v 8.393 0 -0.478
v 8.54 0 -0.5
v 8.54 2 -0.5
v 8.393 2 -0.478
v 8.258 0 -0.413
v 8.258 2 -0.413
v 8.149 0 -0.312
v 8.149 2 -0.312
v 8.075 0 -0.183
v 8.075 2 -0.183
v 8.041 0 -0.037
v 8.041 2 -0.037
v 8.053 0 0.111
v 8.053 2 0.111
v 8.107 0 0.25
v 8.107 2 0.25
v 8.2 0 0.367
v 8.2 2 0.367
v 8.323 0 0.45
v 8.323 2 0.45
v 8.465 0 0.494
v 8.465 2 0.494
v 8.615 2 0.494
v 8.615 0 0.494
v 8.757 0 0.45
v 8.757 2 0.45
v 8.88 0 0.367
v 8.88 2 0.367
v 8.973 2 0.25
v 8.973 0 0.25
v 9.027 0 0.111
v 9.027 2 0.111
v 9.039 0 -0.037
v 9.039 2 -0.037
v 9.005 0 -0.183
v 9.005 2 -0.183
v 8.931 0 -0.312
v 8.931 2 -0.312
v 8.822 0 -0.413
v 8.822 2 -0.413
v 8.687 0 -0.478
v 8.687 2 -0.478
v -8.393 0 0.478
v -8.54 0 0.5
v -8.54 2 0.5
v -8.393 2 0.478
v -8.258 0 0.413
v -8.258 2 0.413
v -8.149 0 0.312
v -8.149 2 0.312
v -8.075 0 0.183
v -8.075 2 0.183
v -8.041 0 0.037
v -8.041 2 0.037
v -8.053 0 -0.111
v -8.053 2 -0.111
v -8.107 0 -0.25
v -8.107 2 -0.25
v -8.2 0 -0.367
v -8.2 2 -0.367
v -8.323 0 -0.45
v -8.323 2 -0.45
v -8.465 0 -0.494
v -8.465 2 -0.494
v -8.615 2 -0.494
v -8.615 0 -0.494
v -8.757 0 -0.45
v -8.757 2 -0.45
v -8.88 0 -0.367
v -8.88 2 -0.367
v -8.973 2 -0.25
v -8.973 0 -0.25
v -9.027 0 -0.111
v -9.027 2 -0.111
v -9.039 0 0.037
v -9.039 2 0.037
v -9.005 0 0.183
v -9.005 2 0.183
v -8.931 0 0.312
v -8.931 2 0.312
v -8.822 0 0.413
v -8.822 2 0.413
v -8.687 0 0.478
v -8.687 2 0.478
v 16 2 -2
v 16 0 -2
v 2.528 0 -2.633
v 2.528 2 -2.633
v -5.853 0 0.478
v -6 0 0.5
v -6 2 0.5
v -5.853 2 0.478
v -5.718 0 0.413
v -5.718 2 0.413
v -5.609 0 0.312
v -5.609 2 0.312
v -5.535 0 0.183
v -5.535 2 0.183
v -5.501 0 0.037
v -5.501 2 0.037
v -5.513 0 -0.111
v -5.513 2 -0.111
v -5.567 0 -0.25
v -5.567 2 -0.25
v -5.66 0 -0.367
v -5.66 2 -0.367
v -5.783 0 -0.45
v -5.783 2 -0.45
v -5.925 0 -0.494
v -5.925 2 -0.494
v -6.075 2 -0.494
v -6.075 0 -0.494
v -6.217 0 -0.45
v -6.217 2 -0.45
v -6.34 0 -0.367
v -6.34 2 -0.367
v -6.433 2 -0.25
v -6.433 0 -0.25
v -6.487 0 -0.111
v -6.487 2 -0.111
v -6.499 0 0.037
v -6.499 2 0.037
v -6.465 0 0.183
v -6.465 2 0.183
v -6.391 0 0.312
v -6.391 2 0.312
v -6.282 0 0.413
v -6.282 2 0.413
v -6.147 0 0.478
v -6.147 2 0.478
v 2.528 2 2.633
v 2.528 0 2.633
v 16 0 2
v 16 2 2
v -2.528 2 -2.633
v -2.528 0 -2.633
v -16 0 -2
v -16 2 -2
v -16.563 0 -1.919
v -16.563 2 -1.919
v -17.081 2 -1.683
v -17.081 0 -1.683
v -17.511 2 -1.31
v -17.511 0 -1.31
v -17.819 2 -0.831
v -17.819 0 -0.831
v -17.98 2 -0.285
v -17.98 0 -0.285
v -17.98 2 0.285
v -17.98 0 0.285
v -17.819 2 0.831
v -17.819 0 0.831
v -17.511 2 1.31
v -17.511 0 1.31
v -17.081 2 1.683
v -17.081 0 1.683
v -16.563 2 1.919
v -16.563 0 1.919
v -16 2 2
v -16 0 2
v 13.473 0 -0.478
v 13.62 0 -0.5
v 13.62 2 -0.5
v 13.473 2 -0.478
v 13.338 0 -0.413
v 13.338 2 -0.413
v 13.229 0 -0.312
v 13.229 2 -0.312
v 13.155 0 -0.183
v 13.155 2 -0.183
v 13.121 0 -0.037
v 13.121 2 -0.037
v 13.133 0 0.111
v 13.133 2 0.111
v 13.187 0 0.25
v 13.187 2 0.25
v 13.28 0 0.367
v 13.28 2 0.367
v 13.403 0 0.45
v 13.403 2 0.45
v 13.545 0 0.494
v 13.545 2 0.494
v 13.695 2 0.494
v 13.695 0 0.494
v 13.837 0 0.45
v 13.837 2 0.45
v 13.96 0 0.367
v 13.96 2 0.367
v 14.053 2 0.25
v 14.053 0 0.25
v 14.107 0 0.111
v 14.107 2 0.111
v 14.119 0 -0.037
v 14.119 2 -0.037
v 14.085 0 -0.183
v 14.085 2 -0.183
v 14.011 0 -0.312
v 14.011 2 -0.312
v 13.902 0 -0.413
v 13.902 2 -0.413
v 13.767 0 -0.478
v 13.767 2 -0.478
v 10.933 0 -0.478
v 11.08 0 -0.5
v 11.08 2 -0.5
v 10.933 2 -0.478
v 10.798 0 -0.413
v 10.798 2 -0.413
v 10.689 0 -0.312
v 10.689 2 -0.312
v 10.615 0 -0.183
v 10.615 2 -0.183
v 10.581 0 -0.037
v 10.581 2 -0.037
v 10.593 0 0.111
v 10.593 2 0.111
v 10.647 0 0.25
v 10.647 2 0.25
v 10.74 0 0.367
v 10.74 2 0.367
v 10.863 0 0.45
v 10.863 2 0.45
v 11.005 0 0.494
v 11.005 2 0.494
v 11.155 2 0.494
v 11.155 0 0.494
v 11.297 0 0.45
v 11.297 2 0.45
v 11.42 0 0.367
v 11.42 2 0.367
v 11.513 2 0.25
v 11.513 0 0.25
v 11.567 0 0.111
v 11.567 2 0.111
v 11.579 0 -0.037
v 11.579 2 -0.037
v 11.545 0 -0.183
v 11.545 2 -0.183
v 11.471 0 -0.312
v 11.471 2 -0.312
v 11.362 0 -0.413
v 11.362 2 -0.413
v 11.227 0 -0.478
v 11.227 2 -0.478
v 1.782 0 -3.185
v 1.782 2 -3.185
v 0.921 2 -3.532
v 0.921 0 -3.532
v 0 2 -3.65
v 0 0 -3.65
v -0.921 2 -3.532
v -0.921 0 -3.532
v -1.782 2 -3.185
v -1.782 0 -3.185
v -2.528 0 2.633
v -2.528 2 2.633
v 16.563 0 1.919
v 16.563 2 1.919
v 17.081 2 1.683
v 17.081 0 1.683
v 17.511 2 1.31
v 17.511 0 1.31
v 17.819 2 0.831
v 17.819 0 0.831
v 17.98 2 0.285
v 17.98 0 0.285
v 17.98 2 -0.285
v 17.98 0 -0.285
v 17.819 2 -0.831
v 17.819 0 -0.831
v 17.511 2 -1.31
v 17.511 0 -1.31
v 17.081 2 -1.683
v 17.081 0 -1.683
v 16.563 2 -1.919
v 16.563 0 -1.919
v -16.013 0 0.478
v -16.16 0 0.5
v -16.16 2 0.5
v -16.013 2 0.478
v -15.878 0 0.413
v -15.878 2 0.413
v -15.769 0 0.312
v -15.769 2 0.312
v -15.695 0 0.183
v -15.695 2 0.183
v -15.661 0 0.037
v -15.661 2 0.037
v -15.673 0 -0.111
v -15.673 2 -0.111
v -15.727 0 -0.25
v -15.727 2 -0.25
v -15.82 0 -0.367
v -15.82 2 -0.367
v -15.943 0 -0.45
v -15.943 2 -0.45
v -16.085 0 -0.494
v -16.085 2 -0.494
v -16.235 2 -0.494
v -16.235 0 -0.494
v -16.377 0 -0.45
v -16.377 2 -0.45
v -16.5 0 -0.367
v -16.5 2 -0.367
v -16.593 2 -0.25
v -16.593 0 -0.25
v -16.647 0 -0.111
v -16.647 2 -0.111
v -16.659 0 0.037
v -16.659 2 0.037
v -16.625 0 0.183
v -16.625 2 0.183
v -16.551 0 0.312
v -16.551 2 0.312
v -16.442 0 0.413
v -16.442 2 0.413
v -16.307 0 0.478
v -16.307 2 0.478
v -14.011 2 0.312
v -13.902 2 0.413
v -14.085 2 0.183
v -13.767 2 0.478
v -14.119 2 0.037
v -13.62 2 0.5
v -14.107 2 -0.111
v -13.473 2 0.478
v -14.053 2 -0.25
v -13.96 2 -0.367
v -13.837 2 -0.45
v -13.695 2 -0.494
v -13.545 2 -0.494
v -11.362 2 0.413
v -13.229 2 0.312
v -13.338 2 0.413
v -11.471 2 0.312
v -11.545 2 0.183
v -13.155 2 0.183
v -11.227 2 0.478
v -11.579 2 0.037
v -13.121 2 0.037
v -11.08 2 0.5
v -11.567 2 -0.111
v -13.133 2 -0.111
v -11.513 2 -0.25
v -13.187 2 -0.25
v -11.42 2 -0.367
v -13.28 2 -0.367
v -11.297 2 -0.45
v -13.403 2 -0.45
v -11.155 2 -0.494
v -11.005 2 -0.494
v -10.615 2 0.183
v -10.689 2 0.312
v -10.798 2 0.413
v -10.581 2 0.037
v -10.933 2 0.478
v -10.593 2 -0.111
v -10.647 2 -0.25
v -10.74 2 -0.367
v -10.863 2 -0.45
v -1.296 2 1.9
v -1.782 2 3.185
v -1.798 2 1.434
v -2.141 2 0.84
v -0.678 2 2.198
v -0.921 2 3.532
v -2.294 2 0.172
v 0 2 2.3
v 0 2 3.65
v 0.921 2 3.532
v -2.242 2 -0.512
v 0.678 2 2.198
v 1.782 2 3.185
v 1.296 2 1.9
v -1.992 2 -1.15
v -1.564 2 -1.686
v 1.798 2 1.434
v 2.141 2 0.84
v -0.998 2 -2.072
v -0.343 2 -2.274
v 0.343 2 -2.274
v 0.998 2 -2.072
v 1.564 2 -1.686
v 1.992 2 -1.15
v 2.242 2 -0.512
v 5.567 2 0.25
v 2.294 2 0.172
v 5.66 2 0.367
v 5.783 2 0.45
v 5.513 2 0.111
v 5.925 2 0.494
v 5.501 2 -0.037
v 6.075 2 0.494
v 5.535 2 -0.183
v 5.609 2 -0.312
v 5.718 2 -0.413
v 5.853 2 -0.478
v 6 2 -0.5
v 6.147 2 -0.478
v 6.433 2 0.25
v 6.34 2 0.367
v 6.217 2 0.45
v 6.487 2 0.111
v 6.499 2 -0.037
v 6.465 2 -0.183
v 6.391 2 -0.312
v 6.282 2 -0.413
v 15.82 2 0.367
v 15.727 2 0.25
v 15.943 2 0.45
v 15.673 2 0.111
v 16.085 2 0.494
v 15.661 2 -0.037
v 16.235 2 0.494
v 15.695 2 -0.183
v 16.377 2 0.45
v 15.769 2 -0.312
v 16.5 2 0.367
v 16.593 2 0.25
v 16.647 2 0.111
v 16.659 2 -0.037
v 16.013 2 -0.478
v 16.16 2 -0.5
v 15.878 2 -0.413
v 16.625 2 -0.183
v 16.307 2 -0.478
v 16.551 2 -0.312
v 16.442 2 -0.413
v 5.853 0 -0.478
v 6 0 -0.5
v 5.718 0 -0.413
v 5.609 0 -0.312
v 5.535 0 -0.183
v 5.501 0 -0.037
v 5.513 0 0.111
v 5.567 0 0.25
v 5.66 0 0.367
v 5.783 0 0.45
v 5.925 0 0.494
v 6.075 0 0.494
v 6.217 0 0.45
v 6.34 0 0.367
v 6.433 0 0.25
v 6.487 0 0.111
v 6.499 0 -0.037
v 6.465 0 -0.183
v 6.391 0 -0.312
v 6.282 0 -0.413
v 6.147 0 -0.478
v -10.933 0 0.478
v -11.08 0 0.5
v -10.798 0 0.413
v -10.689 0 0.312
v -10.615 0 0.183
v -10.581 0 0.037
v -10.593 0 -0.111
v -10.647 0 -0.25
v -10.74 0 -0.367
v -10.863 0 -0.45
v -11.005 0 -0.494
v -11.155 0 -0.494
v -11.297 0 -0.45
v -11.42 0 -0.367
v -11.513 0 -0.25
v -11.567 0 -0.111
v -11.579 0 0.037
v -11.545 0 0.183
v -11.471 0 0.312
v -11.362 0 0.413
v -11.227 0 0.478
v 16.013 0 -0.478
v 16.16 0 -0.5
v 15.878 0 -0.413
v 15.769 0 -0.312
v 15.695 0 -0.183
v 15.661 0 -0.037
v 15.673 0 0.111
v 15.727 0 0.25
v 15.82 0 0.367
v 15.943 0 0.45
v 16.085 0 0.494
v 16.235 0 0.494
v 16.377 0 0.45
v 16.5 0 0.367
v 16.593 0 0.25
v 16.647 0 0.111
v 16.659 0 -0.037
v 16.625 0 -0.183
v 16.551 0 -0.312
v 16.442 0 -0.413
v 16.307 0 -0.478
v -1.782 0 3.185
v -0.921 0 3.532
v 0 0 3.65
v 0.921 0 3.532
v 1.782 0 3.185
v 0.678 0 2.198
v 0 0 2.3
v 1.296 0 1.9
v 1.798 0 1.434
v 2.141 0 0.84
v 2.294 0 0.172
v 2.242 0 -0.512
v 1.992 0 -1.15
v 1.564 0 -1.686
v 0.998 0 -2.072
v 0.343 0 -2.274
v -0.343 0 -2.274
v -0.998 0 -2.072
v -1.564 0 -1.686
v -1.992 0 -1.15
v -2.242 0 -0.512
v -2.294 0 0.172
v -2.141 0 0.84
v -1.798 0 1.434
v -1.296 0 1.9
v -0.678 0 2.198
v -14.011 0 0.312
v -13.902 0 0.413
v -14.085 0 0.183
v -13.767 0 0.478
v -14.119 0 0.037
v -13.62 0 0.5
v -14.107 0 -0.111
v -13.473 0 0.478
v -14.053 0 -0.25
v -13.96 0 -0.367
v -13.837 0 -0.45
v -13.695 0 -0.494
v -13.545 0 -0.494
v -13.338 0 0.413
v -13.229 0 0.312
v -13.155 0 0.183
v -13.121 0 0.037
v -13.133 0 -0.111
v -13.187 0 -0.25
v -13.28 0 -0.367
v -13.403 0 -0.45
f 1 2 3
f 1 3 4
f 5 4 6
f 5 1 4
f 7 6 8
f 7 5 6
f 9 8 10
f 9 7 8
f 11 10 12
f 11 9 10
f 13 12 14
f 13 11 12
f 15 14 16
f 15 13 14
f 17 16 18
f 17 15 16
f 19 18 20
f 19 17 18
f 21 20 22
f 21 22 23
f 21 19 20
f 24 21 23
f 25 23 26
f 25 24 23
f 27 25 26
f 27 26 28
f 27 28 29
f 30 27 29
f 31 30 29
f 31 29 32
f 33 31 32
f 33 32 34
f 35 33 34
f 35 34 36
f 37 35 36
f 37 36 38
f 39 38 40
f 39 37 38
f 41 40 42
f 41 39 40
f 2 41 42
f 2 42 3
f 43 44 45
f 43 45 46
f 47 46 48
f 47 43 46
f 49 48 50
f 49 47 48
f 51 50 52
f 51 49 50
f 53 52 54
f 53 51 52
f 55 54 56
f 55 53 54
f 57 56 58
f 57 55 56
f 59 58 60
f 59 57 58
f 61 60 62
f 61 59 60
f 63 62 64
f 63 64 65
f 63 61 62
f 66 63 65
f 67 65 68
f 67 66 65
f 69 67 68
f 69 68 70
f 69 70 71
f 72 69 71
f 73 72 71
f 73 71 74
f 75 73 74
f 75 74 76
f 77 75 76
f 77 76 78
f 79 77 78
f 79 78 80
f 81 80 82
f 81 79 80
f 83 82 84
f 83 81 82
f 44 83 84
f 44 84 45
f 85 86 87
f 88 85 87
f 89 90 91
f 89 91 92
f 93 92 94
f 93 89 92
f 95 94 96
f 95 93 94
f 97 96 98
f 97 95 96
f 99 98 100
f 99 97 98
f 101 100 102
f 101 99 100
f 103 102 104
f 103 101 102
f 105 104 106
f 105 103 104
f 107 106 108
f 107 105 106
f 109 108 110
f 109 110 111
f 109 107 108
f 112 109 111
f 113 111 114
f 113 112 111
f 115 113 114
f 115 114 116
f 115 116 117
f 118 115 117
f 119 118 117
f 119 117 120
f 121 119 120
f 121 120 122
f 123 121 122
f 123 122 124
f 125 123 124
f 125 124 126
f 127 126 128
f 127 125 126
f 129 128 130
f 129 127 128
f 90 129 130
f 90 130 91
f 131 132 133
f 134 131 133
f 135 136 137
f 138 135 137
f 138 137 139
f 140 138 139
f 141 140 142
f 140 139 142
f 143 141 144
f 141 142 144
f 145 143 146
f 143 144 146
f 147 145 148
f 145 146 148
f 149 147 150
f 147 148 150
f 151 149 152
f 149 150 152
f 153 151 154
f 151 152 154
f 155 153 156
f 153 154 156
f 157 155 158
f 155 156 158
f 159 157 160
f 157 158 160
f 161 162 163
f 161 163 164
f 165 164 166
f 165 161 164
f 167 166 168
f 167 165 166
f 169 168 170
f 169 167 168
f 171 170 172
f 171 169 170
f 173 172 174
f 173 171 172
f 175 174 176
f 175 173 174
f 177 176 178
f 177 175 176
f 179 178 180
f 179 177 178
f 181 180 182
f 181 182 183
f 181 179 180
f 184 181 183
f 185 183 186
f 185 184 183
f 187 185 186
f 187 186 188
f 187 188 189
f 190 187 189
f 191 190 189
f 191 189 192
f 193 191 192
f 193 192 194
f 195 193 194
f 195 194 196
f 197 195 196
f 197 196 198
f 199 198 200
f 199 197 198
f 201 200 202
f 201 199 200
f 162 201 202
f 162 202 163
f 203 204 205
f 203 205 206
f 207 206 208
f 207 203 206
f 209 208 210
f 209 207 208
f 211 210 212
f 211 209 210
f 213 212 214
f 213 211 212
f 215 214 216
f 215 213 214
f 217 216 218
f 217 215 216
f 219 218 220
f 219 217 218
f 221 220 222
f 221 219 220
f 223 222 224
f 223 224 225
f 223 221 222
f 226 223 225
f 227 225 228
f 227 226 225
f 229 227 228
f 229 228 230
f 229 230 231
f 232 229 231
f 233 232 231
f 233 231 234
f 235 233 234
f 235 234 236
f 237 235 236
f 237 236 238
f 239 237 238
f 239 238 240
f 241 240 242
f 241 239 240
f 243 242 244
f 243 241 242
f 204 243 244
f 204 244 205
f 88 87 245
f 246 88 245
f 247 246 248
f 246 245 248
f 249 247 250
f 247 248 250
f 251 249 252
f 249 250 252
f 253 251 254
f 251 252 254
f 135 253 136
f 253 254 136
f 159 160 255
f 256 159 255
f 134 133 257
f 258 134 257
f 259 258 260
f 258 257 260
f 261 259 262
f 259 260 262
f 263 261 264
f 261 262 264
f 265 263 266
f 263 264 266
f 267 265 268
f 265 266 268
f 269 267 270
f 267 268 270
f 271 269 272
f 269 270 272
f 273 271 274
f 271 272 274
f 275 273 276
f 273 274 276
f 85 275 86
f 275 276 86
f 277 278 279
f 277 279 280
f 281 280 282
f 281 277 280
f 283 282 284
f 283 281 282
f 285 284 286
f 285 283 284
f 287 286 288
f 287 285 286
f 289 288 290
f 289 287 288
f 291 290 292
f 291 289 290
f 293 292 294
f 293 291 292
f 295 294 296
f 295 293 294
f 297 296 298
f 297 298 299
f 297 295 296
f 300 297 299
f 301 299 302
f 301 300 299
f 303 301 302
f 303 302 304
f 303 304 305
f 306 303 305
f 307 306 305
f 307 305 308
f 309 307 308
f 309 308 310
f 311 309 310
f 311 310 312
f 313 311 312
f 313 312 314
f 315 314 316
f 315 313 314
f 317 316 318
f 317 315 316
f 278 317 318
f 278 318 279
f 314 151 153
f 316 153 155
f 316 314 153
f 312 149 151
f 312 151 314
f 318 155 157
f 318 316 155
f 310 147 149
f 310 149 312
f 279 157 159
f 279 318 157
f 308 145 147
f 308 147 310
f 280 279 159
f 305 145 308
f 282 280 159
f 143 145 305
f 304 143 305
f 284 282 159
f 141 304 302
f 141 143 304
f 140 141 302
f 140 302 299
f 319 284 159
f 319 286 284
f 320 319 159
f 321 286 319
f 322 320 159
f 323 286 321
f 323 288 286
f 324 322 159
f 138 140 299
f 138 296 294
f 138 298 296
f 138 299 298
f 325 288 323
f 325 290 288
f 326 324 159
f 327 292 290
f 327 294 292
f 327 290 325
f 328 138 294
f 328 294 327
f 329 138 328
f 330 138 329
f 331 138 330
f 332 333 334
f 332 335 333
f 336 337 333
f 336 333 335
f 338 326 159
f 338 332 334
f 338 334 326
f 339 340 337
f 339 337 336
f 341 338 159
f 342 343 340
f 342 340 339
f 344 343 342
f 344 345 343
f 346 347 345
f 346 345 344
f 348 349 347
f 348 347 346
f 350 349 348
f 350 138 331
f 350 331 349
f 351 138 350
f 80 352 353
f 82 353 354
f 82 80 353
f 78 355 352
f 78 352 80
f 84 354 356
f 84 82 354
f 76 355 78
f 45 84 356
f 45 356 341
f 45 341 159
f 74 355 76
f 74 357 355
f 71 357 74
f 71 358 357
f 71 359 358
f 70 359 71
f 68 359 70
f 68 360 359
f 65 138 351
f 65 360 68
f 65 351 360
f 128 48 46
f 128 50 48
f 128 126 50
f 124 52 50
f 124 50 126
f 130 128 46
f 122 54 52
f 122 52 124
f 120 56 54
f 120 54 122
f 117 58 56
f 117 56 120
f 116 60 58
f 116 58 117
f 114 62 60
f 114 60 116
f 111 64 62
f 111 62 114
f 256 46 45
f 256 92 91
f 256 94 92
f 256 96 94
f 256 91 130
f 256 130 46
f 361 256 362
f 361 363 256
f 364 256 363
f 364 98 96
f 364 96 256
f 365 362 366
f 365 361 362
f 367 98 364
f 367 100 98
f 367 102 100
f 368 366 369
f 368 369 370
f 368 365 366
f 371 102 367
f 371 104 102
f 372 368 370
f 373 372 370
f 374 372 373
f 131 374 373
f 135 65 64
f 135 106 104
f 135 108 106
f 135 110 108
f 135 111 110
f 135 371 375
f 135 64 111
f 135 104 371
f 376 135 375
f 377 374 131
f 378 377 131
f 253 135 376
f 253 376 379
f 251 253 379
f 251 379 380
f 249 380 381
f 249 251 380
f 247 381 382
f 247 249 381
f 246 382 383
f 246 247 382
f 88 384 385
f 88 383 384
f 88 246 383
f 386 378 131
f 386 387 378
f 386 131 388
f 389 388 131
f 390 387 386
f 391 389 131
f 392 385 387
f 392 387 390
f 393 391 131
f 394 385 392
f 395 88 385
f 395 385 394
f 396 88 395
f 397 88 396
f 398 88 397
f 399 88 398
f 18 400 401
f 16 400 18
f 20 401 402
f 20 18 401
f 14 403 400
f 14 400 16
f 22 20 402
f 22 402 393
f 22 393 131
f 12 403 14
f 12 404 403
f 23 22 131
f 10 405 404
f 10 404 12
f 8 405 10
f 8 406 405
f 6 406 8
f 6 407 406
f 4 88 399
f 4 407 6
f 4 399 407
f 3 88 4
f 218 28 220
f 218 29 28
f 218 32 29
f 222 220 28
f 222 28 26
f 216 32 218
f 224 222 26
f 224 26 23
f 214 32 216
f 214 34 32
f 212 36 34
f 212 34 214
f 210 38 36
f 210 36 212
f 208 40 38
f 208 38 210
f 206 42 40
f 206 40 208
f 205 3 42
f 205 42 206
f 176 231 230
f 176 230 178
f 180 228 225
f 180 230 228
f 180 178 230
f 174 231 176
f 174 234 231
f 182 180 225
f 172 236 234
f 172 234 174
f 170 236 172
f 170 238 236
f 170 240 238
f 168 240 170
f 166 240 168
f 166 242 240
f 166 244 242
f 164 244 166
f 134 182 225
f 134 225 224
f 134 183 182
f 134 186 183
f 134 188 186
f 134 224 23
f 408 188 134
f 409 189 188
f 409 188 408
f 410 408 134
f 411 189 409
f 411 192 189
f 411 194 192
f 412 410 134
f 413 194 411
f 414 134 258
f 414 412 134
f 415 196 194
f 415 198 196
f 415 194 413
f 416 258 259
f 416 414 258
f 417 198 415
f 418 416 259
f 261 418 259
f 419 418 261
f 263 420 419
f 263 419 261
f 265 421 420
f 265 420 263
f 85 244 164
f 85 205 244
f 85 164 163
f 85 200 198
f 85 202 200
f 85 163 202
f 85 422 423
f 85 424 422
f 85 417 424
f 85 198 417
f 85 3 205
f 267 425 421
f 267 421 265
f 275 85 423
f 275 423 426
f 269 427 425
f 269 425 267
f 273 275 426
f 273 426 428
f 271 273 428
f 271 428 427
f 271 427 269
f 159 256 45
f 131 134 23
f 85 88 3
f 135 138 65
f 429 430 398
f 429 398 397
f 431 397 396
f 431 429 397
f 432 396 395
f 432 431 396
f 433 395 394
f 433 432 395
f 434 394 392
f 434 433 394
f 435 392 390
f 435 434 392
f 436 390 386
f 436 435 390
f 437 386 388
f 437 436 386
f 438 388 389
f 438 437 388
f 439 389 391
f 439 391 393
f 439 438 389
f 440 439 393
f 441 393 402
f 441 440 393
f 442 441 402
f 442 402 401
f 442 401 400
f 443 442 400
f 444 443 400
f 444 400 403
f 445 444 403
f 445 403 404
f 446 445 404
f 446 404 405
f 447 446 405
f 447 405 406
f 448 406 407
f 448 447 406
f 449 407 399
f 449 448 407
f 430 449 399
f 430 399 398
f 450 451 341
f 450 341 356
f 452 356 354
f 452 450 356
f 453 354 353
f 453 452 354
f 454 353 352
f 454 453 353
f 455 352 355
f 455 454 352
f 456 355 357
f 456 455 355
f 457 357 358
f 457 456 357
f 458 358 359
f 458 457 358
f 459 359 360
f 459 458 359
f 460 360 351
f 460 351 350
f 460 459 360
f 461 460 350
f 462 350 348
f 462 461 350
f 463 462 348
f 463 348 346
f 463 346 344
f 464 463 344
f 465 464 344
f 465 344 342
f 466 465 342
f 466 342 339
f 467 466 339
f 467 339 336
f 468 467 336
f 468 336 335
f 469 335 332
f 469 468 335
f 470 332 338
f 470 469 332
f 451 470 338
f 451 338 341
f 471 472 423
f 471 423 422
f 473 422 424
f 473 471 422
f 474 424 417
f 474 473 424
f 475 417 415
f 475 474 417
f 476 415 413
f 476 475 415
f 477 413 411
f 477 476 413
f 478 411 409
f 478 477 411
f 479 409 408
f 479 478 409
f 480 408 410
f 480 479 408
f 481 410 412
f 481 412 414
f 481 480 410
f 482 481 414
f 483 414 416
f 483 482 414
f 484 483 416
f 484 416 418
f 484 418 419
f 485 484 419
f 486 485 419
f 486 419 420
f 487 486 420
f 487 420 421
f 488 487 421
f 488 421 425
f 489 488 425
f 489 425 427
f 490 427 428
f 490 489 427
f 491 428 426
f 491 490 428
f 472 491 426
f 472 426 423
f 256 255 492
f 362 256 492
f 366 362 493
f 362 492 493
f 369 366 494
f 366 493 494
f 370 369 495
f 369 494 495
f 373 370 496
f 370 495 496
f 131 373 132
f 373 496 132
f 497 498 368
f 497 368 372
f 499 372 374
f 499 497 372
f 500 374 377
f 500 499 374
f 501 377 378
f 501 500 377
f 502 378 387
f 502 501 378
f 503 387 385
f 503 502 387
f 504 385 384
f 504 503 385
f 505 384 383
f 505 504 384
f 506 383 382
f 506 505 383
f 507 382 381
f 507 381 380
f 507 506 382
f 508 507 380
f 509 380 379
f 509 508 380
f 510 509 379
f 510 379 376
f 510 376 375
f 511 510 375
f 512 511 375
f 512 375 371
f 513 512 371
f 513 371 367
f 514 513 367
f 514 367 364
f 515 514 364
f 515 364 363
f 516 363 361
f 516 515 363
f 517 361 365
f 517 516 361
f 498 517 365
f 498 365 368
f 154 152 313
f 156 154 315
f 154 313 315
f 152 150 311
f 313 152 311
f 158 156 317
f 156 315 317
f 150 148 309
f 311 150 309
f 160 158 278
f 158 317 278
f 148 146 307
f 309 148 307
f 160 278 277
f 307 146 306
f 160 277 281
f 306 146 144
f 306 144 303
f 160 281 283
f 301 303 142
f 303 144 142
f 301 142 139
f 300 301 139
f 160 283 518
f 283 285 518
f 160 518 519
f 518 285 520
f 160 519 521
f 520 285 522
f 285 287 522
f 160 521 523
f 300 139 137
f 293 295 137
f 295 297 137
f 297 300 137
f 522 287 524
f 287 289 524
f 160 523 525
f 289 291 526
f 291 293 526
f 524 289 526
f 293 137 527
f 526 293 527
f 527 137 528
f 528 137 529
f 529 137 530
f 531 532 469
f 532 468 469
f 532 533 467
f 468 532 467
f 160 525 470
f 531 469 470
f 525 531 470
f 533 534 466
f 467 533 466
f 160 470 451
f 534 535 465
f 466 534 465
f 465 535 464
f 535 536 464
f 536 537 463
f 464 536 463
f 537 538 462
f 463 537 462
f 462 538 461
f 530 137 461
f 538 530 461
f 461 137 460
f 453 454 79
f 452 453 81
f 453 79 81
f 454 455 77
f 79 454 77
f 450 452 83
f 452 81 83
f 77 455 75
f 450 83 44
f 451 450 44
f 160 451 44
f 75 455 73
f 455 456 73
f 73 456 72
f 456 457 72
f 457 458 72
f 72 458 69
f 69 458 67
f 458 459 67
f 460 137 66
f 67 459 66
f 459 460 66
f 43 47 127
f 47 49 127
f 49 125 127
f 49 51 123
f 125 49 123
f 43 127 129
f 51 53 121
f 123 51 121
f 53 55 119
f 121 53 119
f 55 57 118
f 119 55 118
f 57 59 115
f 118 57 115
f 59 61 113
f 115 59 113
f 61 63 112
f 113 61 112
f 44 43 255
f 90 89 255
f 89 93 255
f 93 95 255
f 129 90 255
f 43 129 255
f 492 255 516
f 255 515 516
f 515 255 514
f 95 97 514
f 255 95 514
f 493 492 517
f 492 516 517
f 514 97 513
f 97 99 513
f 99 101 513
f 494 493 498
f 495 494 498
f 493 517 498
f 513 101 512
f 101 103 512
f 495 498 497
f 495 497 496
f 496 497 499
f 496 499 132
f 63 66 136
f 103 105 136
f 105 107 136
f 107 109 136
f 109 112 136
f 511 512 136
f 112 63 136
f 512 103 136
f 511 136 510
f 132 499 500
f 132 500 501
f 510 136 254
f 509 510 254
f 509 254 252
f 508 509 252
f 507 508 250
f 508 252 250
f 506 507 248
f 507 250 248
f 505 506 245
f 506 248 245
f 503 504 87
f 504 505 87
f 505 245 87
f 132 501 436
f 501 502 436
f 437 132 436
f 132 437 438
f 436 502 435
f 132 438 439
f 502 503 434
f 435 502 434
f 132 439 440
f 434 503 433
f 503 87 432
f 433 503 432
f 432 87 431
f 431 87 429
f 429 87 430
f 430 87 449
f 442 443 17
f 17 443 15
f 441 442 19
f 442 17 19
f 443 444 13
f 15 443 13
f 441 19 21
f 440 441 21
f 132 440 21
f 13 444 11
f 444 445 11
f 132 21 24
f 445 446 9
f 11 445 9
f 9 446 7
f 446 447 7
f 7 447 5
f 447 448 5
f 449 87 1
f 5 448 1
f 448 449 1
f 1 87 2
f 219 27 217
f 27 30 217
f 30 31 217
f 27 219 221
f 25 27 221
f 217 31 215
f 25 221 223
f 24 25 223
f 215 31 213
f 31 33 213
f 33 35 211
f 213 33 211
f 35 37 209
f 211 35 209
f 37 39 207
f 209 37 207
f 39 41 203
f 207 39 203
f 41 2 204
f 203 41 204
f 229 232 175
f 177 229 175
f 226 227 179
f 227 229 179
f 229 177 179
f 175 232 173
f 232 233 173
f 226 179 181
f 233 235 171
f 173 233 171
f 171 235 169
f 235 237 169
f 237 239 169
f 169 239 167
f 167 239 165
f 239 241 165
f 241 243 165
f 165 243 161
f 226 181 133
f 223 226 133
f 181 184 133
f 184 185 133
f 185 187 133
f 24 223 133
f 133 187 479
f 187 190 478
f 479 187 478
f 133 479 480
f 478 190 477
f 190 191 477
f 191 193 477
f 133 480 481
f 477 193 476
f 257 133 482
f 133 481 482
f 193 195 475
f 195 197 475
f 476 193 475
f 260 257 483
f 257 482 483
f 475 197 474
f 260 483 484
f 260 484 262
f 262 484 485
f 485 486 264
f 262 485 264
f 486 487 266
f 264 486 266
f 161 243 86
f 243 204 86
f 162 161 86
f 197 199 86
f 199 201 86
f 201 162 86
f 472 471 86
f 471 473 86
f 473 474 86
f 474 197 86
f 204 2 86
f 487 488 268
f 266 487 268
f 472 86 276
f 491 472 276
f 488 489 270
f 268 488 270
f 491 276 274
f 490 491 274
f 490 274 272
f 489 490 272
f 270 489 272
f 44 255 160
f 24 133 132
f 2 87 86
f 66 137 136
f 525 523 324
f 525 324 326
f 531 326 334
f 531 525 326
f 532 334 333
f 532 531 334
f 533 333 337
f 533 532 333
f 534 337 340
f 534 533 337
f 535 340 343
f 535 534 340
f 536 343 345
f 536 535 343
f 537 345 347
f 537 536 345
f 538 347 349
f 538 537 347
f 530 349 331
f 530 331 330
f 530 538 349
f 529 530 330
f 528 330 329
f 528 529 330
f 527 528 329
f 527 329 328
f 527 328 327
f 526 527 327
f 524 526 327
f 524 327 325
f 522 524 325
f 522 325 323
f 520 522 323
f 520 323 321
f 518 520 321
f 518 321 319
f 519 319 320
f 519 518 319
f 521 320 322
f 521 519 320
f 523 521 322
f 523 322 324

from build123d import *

# Parameters (mm, degrees)
SKETCH1_R           = 2.3
SKETCH1_R_2         = 0.5
BOSS_EXTRUDE1_DEPTH = 2


with BuildPart() as part:
    # Sketch1 → Boss-Extrude1 (new body)
    with BuildSketch(Plane(origin=(0, 0, 0), x_dir=(1, 0, 0), z_dir=(0, 1, 0))):
        with BuildLine():
            Line((-16, -2), (-2.528486514, -2.632548127))
            ThreePointArc((-2.528486514, -2.632548127), (1e-09, -3.650200137), (2.528486517, -2.632548127))
            Line((2.528486517, -2.632548127), (16, -2))
            ThreePointArc((16, -2), (18, 0), (16, 2))
            Line((16, 2), (2.528048307, 2.632568703))
            ThreePointArc((2.528048307, 2.632568703), (1e-09, 3.649799863), (-2.528048304, 2.632568703))
            Line((-2.528048304, 2.632568703), (-16, 2))
            ThreePointArc((-16, 2), (-18, 0), (-16, -2))
        make_face()
        with Locations(Location((0, 0, 0), (0, 0, 270))):
            Circle(SKETCH1_R, mode=Mode.SUBTRACT)
        with Locations(Location((-6, 0, 0), (0, 0, 270))):
            Circle(SKETCH1_R_2, mode=Mode.SUBTRACT)
        with Locations(Location((-8.54, 0, 0), (0, 0, 270))):
            Circle(SKETCH1_R_2, mode=Mode.SUBTRACT)
        with Locations(Location((-11.08, 0, 0), (0, 0, 270))):
            Circle(SKETCH1_R_2, mode=Mode.SUBTRACT)
        with Locations(Location((-13.62, 0, 0), (0, 0, 270))):
            Circle(SKETCH1_R_2, mode=Mode.SUBTRACT)
        with Locations(Location((-16.16, 0, 0), (0, 0, 270))):
            Circle(SKETCH1_R_2, mode=Mode.SUBTRACT)
        with Locations(Location((16.16, 0, 0), (0, 0, 90))):
            Circle(SKETCH1_R_2, mode=Mode.SUBTRACT)
        with Locations(Location((13.62, 0, 0), (0, 0, 90))):
            Circle(SKETCH1_R_2, mode=Mode.SUBTRACT)
        with Locations(Location((11.08, 0, 0), (0, 0, 90))):
            Circle(SKETCH1_R_2, mode=Mode.SUBTRACT)
        with Locations(Location((8.54, 0, 0), (0, 0, 90))):
            Circle(SKETCH1_R_2, mode=Mode.SUBTRACT)
        with Locations(Location((6, 0, 0), (0, 0, 90))):
            Circle(SKETCH1_R_2, mode=Mode.SUBTRACT)
    extrude(amount=BOSS_EXTRUDE1_DEPTH)


solid = part.part
